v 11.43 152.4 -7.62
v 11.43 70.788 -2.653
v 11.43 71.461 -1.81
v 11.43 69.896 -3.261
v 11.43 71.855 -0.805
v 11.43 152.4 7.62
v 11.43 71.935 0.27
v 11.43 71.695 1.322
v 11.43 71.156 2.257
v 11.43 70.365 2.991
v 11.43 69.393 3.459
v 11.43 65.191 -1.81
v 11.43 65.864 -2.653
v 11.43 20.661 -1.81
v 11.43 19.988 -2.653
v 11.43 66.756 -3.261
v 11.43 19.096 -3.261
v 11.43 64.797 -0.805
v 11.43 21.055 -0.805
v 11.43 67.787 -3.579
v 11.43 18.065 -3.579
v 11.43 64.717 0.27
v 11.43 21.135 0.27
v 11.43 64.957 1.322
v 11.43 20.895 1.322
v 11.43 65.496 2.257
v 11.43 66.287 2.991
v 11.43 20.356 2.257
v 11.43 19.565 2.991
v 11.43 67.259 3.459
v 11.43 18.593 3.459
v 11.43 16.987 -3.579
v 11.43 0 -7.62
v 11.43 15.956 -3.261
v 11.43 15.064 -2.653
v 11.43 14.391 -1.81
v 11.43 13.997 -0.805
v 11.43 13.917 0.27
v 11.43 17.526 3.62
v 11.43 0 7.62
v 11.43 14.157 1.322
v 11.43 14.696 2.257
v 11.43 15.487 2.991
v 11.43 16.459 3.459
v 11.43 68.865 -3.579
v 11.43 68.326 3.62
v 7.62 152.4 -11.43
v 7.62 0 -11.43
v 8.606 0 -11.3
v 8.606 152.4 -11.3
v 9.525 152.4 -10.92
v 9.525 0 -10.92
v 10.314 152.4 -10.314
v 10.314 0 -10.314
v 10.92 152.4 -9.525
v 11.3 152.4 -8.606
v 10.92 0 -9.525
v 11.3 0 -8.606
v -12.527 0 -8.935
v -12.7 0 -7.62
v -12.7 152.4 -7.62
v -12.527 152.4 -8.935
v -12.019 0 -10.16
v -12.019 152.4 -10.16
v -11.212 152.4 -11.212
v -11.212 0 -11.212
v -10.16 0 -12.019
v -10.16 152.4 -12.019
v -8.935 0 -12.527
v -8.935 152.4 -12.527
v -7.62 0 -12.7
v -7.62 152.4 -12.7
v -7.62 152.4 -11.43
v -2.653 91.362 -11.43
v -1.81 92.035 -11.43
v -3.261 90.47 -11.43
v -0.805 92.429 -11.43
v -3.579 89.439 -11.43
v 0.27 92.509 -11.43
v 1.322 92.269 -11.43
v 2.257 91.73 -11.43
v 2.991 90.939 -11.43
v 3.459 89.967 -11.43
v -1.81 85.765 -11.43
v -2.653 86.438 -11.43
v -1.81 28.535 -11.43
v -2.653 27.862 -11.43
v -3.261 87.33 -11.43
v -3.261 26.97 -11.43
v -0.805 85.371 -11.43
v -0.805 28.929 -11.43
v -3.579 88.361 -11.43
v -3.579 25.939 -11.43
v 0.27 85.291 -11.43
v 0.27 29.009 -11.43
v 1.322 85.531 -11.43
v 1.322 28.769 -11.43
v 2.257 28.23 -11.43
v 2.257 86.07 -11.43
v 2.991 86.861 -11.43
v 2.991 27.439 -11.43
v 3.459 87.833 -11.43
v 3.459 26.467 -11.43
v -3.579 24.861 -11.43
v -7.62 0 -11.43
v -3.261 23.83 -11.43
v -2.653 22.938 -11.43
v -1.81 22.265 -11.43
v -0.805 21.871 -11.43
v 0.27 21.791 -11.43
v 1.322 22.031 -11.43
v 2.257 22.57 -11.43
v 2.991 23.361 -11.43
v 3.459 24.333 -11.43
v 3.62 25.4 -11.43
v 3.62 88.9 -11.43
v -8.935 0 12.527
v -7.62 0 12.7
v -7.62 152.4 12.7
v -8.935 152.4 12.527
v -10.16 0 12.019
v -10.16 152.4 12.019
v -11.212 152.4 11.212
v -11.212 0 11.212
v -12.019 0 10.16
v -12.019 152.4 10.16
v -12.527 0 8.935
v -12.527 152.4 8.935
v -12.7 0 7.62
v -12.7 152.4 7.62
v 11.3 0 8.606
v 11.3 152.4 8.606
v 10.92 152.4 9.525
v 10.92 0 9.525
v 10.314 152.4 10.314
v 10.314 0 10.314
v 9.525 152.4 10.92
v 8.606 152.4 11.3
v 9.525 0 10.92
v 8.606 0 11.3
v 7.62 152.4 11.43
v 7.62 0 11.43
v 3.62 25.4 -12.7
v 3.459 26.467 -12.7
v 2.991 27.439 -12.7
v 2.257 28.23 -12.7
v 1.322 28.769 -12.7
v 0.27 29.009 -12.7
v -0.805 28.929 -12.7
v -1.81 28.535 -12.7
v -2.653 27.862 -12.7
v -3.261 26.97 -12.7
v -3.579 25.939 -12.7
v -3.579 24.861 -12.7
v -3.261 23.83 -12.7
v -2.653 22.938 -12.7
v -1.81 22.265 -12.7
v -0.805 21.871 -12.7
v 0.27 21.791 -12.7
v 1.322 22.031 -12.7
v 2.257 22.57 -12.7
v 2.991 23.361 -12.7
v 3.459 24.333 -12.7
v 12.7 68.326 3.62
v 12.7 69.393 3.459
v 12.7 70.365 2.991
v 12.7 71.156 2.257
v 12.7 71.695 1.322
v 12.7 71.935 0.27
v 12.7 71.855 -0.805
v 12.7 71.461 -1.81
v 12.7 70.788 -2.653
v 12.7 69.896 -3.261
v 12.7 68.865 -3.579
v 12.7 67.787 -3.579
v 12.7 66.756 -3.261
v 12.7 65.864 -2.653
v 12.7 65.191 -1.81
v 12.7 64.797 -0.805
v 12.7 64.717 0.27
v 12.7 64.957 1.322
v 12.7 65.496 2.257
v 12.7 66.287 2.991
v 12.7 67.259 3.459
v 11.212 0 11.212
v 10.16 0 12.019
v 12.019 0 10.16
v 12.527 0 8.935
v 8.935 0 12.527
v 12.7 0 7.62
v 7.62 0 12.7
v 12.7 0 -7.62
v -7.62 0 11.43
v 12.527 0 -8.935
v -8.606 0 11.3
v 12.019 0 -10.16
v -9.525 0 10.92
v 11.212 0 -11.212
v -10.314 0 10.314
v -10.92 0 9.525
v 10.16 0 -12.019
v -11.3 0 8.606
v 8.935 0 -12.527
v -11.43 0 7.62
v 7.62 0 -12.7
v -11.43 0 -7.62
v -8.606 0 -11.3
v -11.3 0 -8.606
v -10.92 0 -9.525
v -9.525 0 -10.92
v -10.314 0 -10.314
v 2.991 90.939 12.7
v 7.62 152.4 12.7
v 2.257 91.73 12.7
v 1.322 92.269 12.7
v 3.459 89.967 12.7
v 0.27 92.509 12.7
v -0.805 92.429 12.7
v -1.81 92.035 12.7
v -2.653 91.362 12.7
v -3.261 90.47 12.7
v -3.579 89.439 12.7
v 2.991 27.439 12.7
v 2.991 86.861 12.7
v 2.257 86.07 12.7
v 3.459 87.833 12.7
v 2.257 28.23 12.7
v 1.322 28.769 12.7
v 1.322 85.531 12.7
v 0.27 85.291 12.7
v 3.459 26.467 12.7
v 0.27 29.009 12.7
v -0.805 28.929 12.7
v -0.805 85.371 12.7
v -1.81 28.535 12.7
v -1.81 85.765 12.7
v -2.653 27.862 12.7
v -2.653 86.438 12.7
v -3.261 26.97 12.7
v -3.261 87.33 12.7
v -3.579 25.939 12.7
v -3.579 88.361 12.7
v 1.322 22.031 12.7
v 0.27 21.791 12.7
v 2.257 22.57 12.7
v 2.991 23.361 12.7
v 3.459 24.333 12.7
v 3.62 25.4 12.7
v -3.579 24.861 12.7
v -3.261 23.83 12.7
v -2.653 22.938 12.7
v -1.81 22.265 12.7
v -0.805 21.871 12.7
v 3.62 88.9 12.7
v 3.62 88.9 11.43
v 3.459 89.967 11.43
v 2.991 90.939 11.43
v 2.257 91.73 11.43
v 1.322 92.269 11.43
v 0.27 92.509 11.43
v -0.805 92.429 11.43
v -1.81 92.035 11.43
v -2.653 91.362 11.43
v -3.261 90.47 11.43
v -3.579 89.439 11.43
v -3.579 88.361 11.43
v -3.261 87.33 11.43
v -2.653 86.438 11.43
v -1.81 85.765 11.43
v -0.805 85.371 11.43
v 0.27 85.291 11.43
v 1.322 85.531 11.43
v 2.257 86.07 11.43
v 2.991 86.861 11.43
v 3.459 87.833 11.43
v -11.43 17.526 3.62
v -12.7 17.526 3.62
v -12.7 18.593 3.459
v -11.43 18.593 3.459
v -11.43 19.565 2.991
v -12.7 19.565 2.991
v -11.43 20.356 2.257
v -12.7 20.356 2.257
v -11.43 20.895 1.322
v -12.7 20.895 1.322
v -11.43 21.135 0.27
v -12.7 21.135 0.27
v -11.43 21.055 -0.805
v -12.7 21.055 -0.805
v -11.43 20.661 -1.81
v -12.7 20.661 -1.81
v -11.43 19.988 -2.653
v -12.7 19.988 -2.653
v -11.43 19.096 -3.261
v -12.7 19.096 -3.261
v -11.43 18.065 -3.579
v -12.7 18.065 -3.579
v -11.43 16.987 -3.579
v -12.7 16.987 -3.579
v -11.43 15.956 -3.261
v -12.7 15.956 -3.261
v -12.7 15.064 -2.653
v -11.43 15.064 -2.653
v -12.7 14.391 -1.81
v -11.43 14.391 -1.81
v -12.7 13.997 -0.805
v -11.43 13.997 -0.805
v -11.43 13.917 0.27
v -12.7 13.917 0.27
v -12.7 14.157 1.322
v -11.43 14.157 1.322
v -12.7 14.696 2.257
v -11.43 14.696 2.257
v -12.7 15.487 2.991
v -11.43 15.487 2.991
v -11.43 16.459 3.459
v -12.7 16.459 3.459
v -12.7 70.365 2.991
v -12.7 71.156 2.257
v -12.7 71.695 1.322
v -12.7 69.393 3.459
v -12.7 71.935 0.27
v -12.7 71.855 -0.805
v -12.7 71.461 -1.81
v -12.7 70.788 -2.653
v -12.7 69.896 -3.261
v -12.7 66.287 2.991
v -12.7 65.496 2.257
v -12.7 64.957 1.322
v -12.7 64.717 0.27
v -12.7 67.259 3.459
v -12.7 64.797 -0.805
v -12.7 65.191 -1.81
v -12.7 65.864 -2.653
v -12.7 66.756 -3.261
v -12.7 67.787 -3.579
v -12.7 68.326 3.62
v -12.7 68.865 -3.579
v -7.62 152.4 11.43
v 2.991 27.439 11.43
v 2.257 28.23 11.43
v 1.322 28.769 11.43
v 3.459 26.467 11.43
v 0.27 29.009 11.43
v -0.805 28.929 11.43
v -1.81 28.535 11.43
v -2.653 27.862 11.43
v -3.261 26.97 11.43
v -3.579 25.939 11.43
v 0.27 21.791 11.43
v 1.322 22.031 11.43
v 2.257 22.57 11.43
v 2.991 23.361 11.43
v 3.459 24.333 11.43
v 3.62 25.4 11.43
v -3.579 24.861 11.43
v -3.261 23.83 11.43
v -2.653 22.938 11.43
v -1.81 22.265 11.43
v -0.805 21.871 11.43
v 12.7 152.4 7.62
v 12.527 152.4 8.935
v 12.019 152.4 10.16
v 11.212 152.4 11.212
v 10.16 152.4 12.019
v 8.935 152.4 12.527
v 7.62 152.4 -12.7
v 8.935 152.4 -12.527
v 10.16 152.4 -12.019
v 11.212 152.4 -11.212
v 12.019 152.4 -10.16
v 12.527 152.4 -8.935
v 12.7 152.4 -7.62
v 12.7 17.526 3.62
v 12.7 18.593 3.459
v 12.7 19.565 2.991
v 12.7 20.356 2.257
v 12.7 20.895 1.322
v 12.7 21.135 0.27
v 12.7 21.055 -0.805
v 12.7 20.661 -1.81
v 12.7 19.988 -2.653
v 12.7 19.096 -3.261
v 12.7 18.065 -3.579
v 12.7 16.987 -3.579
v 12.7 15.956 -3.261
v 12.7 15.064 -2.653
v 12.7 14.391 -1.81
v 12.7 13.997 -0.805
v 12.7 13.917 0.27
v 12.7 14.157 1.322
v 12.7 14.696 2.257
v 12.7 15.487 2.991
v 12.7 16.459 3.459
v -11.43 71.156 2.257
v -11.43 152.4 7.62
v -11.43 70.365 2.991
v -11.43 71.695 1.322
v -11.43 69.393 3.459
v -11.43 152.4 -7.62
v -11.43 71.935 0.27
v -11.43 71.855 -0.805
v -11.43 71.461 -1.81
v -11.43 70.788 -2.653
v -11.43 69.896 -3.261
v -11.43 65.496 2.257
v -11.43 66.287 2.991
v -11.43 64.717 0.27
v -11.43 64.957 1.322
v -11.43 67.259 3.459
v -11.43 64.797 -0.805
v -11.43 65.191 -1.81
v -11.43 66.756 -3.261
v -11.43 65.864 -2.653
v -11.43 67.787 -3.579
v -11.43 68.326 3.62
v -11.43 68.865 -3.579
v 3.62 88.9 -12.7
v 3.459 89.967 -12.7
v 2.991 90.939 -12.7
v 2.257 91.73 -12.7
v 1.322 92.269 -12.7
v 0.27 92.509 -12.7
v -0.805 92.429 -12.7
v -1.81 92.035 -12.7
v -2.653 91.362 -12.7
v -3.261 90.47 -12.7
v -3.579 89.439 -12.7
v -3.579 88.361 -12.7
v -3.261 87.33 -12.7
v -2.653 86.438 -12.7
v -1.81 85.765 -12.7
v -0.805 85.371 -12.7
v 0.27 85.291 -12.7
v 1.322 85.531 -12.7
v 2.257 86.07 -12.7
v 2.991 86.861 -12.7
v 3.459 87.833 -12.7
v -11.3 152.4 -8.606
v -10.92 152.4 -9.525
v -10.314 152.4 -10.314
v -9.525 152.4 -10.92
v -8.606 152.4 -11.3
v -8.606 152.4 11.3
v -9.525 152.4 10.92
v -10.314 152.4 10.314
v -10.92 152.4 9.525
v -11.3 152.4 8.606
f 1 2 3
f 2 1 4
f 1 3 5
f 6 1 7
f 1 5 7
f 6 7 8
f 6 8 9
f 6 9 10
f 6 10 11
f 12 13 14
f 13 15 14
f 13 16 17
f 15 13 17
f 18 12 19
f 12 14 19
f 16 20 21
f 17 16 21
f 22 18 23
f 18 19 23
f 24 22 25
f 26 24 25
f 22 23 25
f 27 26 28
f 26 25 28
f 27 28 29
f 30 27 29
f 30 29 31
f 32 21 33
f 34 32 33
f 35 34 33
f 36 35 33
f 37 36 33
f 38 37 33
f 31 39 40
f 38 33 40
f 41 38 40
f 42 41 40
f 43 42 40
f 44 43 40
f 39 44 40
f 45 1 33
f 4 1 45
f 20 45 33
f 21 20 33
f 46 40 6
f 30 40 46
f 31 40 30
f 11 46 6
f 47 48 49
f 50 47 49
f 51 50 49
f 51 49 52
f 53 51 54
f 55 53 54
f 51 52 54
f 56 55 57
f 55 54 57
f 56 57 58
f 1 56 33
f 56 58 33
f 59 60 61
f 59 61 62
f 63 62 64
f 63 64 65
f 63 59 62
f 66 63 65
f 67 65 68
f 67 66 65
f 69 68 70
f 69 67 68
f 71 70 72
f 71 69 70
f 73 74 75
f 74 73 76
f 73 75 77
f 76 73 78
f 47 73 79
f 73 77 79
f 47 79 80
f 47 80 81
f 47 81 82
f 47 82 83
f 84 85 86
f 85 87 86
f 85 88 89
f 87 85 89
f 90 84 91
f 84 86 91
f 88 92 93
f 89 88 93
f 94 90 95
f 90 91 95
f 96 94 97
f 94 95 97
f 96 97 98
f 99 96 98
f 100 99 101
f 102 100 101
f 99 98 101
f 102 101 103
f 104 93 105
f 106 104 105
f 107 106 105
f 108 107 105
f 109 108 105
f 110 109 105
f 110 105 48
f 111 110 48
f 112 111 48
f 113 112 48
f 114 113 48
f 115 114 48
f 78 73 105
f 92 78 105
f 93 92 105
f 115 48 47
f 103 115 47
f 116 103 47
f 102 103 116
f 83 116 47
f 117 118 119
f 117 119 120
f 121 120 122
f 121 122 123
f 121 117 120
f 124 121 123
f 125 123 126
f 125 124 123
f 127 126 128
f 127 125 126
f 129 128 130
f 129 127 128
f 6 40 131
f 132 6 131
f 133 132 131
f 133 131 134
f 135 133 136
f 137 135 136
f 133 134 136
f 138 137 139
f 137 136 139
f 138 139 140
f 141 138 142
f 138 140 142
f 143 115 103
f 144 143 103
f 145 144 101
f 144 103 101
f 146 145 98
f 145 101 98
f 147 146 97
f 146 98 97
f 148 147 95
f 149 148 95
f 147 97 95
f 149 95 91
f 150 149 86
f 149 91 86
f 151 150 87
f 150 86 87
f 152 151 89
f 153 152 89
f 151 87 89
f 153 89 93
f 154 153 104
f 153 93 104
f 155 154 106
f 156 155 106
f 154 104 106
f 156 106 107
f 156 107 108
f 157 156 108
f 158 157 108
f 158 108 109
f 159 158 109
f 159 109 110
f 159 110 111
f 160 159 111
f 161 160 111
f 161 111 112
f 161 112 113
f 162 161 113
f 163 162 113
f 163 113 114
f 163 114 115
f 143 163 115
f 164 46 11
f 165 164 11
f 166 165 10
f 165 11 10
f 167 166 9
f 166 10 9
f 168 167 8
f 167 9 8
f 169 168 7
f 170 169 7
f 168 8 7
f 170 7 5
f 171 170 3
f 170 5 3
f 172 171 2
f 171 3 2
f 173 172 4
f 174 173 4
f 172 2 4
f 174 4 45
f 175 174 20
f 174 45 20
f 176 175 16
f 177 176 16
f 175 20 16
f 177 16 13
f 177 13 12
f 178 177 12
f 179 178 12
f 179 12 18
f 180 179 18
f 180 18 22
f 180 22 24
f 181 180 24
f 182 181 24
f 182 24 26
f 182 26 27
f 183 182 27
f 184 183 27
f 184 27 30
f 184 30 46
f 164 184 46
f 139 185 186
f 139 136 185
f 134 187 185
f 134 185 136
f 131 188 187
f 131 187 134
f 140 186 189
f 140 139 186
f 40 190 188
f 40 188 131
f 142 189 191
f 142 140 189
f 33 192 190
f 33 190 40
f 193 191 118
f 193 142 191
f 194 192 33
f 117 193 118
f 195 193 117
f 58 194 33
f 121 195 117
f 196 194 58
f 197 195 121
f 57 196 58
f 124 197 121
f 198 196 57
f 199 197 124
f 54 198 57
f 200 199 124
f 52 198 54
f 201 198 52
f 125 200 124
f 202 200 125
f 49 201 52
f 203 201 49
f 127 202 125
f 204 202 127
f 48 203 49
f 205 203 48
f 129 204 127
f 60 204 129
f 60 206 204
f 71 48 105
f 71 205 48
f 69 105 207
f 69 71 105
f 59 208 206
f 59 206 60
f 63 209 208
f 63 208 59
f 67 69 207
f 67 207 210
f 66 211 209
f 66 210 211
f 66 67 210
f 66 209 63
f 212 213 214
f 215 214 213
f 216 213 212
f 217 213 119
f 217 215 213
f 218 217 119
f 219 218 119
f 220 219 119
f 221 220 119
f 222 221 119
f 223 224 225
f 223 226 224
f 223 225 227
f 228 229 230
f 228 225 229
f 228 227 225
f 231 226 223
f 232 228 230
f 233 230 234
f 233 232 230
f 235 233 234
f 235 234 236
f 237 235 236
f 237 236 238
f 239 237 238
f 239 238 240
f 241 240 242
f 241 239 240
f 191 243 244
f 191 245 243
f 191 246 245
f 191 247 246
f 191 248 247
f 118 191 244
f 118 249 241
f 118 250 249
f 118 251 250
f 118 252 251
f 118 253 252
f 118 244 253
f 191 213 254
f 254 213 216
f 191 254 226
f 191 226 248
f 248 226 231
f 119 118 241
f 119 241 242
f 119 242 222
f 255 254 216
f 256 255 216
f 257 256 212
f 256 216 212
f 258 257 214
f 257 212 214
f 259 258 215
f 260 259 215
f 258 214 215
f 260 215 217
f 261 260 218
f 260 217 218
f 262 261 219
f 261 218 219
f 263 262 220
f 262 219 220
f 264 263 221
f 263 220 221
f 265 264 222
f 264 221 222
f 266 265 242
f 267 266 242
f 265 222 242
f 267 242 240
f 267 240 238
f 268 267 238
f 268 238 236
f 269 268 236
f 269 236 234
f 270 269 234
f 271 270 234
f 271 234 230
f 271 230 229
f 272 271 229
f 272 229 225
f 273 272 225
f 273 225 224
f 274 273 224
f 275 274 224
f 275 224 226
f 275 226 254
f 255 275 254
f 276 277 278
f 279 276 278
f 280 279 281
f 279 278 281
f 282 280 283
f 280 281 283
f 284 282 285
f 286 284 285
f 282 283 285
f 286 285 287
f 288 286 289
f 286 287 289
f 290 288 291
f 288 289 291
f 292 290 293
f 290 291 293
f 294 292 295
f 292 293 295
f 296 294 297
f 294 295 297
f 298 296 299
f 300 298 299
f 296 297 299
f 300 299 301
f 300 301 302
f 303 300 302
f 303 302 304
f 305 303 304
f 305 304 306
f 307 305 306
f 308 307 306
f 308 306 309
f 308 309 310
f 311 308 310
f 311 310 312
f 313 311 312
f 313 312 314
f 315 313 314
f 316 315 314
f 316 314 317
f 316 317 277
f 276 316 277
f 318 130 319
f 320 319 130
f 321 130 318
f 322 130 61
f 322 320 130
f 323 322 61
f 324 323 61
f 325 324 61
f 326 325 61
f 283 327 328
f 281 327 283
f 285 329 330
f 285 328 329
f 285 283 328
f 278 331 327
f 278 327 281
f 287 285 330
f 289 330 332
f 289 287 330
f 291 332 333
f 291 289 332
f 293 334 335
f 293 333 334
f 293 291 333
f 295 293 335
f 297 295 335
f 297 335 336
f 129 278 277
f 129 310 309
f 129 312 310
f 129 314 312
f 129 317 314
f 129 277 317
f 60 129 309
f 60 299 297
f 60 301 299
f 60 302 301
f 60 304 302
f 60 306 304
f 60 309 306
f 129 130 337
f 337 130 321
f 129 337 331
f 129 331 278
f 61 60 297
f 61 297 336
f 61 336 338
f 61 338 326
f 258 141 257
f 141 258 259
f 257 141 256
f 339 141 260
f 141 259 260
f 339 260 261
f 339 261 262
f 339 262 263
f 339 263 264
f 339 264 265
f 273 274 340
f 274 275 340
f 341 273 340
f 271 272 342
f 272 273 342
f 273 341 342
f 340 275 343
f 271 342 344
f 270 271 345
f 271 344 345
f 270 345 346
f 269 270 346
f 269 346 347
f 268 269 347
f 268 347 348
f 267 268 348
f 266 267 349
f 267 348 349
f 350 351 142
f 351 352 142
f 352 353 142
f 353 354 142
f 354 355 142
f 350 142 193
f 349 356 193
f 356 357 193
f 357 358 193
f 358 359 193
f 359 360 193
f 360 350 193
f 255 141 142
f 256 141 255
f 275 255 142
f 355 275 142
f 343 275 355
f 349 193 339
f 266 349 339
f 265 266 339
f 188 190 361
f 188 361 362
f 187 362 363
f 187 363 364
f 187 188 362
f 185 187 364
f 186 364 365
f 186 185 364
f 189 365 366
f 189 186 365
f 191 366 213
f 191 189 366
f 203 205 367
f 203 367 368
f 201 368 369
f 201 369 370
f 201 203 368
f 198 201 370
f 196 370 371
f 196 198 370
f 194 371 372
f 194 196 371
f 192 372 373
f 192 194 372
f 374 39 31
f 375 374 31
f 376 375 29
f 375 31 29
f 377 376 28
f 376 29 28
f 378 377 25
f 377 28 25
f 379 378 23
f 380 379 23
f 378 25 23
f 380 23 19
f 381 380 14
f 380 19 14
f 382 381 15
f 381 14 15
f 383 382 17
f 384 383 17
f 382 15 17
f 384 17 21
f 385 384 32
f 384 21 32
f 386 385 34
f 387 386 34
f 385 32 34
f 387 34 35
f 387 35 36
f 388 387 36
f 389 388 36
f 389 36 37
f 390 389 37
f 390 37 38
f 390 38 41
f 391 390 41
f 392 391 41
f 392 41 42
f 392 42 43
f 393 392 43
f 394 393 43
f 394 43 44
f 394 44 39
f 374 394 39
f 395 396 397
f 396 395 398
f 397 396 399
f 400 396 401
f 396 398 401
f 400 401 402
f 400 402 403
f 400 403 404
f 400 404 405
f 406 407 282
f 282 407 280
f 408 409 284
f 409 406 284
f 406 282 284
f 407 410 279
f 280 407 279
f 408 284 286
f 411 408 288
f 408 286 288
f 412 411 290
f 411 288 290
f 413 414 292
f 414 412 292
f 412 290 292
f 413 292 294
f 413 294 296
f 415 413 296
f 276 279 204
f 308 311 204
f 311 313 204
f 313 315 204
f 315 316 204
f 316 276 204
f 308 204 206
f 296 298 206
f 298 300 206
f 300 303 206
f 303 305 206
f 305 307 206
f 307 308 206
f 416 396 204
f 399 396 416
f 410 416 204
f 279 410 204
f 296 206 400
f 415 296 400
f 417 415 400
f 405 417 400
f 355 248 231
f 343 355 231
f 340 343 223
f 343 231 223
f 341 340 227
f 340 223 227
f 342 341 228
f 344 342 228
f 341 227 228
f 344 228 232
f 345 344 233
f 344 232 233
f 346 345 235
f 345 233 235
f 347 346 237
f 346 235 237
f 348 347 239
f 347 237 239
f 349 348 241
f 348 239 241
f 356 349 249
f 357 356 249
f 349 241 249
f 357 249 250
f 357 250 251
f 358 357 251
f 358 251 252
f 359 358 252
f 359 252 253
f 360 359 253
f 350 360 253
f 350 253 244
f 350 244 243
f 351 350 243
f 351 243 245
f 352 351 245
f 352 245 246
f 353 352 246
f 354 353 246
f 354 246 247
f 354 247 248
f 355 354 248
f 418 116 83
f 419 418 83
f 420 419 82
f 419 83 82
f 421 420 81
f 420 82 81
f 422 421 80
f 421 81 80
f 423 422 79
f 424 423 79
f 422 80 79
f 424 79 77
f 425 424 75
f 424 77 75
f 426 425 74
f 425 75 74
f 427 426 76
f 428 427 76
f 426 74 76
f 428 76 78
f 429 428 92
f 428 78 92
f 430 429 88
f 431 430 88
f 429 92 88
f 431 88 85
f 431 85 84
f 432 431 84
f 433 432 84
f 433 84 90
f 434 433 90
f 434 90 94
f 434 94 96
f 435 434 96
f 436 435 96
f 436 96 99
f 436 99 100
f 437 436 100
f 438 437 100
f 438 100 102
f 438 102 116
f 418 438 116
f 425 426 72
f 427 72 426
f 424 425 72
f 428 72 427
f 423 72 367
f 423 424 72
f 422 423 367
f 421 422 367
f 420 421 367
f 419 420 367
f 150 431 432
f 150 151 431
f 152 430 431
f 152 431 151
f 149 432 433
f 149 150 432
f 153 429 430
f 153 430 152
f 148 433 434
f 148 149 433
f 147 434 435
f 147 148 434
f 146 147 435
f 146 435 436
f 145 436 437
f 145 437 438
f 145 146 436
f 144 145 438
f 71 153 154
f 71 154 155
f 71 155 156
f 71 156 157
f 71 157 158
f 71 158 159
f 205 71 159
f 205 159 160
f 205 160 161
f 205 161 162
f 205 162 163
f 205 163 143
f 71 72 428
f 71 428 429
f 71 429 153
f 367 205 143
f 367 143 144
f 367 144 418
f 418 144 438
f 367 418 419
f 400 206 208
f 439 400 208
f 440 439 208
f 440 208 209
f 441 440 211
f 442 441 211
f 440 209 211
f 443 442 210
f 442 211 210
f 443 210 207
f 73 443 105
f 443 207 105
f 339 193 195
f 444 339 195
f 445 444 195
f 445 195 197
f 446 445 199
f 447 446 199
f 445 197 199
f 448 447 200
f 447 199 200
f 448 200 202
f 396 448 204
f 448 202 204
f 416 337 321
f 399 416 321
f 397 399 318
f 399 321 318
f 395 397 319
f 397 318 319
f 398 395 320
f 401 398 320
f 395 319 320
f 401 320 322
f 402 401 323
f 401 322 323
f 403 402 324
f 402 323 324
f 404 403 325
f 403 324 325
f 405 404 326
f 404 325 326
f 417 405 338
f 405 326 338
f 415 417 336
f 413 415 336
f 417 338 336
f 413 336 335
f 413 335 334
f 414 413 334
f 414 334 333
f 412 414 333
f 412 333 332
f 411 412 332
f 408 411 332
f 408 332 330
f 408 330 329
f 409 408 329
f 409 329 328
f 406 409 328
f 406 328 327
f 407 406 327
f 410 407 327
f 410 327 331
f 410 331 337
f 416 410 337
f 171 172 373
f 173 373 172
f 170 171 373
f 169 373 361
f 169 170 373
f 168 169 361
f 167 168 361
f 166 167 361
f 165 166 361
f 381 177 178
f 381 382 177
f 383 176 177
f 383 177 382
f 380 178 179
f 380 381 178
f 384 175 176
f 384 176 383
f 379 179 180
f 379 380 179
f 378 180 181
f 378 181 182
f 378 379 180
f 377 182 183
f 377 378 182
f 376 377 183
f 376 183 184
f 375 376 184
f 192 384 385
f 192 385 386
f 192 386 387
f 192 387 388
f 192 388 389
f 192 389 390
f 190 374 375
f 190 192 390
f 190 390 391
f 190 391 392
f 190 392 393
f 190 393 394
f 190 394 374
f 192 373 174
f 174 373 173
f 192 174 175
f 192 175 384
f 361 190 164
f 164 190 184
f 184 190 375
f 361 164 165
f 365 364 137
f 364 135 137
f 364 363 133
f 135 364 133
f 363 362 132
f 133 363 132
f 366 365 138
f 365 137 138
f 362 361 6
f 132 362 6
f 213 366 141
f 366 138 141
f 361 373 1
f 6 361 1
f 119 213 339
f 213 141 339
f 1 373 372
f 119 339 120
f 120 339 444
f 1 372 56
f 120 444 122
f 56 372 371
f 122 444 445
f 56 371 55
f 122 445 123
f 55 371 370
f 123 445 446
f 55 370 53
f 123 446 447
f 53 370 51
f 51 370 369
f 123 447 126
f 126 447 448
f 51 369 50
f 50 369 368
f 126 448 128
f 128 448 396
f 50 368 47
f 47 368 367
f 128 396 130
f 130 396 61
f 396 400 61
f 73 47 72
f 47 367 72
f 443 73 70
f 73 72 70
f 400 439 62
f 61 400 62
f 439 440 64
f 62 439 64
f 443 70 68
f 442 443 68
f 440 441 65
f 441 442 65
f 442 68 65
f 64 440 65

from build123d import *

# Parameters (mm, degrees)
BOSS_EXTRUDE1_DEPTH = 152.4
SKETCH2_R           = 3.6195
CUT_EXTRUDE1_DEPTH  = 26.4
SKETCH3_R           = 3.6195
CUT_EXTRUDE2_DEPTH  = 26.4


with BuildPart() as part:
    # Sketch1 → Boss-Extrude1 (new body)
    with BuildSketch(Plane(origin=(0, 0, 0), x_dir=(1, 0, 0), z_dir=(0, 1, 0))):
        with BuildLine():
            Line((-7.62, 12.7), (7.62, 12.7))
            ThreePointArc((7.62, 12.7), (11.212102448, 11.212102448), (12.7, 7.62))
            Line((12.7, 7.62), (12.7, -7.62))
            ThreePointArc((12.7, -7.62), (11.212102448, -11.212102448), (7.62, -12.7))
            Line((7.62, -12.7), (-7.62, -12.7))
            ThreePointArc((-7.62, -12.7), (-11.212102448, -11.212102448), (-12.7, -7.62))
            Line((-12.7, -7.62), (-12.7, 7.62))
            ThreePointArc((-12.7, 7.62), (-11.212102448, 11.212102448), (-7.62, 12.7))
        make_face()
        with BuildLine():
            Line((-7.62, 11.43), (7.62, 11.43))
            ThreePointArc((7.62, 11.43), (10.314076836, 10.314076836), (11.43, 7.62))
            Line((11.43, 7.62), (11.43, -7.62))
            ThreePointArc((11.43, -7.62), (10.314076836, -10.314076836), (7.62, -11.43))
            Line((7.62, -11.43), (-7.62, -11.43))
            ThreePointArc((-7.62, -11.43), (-10.314076836, -10.314076836), (-11.43, -7.62))
            Line((-11.43, -7.62), (-11.43, 7.62))
            ThreePointArc((-11.43, 7.62), (-10.314076836, 10.314076836), (-7.62, 11.43))
        make_face(mode=Mode.SUBTRACT)
    extrude(amount=BOSS_EXTRUDE1_DEPTH)

    # Sketch2 → Cut-Extrude1 (cut, through all)
    with BuildSketch(Plane.XY.offset(12.7)):
        with Locations((0, 88.9)):
            Circle(SKETCH2_R)
        with Locations((0, 25.4)):
            Circle(SKETCH2_R)
    extrude(amount=-CUT_EXTRUDE1_DEPTH, mode=Mode.SUBTRACT)

    # Sketch3 → Cut-Extrude2 (cut, through all)
    with BuildSketch(Plane.ZY.offset(12.7)):
        with Locations((0, 68.326)):
            Circle(SKETCH3_R)
        with Locations((0, 17.526)):
            Circle(SKETCH3_R)
    extrude(amount=-CUT_EXTRUDE2_DEPTH, mode=Mode.SUBTRACT)


solid = part.part
